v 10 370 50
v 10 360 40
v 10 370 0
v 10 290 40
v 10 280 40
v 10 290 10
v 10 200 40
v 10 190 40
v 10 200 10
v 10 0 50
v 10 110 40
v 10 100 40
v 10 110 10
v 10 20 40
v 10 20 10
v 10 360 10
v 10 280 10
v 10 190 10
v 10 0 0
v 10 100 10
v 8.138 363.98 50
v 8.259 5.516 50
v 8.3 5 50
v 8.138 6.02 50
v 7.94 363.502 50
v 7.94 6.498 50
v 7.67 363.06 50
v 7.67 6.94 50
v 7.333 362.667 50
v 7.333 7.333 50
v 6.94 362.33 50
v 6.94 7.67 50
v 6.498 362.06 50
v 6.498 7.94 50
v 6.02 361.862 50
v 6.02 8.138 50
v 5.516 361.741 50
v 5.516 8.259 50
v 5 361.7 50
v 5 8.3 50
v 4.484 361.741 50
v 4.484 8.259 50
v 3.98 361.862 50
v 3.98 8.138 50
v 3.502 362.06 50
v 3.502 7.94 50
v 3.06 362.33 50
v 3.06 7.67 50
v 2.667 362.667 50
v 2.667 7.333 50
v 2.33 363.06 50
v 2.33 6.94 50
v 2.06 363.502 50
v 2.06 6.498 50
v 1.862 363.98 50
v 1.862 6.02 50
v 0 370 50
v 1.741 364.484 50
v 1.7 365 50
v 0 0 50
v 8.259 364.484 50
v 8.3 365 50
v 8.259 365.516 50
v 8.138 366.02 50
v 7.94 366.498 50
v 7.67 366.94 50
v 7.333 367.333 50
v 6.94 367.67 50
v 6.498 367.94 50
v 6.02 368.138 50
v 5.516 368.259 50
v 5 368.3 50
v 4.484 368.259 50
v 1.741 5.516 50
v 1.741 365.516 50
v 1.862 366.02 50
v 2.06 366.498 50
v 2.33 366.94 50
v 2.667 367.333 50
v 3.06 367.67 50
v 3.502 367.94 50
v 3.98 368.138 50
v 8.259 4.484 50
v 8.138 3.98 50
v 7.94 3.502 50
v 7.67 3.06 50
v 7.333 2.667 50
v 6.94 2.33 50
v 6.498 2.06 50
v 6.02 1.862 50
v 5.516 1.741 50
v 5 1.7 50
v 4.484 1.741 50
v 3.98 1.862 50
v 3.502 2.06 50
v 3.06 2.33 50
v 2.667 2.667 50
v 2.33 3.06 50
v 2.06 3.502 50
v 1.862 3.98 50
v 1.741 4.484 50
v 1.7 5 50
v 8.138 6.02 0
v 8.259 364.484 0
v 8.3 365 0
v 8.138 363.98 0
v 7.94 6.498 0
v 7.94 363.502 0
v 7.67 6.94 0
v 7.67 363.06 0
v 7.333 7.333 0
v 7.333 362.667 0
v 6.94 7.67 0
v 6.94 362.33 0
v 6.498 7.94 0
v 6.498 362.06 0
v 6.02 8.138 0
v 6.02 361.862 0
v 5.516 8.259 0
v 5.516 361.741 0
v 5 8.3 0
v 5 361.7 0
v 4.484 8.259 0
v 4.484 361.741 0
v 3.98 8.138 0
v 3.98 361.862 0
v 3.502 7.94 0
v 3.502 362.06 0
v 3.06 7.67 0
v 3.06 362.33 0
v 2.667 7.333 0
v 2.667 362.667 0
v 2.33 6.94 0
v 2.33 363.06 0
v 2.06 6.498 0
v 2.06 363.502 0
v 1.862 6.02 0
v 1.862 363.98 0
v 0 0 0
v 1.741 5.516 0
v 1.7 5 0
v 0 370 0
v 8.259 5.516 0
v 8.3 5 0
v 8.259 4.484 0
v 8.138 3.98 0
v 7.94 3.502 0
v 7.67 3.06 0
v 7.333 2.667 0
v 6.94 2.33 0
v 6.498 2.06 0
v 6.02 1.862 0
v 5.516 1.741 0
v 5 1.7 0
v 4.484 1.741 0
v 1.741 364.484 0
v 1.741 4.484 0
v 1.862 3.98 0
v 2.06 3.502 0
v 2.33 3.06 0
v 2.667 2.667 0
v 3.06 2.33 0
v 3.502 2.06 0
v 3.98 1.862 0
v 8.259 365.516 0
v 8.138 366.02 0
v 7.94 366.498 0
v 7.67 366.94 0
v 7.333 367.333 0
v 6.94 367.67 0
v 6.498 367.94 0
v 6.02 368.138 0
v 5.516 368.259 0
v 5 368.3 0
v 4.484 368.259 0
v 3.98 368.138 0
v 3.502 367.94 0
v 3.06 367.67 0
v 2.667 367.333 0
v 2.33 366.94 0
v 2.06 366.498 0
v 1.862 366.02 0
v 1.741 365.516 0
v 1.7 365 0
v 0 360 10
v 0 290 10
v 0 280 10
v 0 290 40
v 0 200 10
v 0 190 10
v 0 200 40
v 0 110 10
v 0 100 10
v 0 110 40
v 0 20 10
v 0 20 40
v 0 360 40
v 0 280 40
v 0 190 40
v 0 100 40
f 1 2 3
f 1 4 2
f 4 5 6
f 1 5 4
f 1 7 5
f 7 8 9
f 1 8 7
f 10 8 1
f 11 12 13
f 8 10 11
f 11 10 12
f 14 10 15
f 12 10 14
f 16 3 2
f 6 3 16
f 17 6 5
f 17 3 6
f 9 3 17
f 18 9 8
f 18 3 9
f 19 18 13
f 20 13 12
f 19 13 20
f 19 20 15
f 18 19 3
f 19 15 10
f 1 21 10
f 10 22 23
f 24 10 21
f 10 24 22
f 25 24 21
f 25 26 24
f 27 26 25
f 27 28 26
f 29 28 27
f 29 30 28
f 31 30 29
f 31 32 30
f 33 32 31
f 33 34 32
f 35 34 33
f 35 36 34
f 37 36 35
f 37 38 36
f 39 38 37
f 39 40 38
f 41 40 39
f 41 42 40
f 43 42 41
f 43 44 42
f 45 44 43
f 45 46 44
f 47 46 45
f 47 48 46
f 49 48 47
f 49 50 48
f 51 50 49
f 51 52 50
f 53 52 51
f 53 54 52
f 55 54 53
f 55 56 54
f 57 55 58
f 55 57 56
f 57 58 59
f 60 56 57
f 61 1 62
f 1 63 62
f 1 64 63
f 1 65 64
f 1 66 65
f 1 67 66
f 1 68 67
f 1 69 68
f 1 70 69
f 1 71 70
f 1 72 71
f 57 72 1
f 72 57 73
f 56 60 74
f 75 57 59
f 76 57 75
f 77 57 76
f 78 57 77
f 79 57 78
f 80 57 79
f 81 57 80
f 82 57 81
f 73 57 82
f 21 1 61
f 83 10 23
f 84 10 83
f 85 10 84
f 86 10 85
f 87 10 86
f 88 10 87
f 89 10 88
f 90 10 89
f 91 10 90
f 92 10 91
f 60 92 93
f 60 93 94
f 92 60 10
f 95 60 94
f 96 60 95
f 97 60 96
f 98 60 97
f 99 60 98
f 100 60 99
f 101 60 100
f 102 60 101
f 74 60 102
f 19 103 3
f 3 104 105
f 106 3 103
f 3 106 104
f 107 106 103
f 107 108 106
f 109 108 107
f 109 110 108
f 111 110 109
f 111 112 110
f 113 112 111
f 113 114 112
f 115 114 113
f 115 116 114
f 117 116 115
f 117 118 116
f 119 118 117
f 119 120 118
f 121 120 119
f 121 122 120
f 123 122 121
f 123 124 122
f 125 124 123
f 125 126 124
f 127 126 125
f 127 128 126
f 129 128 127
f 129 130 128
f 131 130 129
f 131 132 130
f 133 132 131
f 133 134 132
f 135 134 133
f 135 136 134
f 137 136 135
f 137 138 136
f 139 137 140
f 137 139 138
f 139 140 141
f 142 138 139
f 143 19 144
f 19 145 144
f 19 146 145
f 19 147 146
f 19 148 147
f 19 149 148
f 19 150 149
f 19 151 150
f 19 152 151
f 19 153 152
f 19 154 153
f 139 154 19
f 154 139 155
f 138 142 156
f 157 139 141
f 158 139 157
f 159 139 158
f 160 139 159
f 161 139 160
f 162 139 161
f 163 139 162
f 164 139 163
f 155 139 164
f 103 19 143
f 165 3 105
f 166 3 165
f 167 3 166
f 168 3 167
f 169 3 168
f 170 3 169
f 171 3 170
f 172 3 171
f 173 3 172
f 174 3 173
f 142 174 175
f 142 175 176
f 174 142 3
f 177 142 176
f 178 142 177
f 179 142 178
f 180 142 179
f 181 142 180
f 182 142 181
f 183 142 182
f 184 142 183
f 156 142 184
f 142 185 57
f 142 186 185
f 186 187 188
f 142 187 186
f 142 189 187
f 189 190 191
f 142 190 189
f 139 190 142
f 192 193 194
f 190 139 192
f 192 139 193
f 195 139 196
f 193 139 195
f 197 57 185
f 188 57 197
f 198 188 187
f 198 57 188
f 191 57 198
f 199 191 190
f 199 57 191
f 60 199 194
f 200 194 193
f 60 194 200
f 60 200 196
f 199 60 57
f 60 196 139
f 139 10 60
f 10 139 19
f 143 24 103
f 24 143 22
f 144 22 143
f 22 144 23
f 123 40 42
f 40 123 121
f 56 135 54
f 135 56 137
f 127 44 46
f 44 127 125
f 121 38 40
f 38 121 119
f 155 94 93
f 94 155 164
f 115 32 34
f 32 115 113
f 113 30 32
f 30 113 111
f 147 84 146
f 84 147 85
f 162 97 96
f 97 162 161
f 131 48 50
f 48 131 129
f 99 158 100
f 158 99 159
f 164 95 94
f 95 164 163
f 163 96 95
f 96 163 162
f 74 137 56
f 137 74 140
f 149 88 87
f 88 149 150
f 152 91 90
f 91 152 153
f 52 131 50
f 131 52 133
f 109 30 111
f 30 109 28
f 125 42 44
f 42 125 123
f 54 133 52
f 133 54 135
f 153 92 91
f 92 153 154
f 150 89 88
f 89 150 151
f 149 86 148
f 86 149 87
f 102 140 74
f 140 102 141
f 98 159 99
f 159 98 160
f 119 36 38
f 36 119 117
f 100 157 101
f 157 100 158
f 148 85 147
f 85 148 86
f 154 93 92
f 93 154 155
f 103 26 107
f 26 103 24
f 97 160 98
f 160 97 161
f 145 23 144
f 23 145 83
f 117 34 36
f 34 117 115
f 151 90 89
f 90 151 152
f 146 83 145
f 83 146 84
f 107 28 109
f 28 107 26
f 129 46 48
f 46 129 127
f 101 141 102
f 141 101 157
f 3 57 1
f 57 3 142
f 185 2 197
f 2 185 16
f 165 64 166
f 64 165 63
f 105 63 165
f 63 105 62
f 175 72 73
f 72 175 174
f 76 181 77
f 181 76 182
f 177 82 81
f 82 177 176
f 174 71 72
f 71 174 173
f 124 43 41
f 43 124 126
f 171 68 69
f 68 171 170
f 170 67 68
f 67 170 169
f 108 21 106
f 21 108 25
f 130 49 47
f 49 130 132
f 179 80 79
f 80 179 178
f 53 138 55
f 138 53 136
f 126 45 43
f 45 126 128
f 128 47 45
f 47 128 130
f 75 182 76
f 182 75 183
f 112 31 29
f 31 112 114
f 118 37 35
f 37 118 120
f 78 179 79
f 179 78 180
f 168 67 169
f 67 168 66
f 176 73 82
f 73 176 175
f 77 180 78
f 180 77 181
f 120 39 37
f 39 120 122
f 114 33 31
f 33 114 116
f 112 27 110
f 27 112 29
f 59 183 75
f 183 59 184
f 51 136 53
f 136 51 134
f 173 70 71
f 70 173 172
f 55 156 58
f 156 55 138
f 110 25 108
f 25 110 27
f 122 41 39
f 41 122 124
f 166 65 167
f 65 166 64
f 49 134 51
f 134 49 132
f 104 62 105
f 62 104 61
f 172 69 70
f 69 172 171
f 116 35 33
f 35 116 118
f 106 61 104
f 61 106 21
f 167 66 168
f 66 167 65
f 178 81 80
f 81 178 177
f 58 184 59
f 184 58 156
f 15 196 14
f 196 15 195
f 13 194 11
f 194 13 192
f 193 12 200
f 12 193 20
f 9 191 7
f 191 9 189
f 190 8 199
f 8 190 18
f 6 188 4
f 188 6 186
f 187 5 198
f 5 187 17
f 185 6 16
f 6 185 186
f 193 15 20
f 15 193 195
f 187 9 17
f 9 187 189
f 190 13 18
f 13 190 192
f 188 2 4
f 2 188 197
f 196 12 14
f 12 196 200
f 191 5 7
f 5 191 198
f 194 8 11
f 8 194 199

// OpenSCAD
// cage_side_xpos.scad
// Generates one 50mm-tall side band for the +X wall.
// Print orientation: lies flat on z=0, thickness in +Z.
// Parameters
bar = 10;              // bar thickness (square)
inner = 350;           // internal span in Y for this wall
segH = 50;             // segment height
holeD = 6.6;           // clearance for M6 threaded rod
// grid parameters (uniform)
gap = 80;              // uniform gap between vertical bars (50-100 ok)
// Derived
outer = inner + 2*bar;  // total length including corner bars

module corner_block(){
    // 10x10 corner post section for this 50mm band, with rod hole
    difference(){
        cube([bar, bar, segH], center=false);
        translate([bar/2, bar/2, 0]) cylinder(d=holeD, h=segH, $fn=40);
    }
}

module side_band_x(){
    // Local coordinates:
    // X thickness is bar (0..bar)
    // Y runs along wall length (0..outer)
    // Z height (0..segH)

    union(){
        // corner blocks at both ends
        translate([0, 0, 0]) corner_block();
        translate([0, outer-bar, 0]) corner_block();

        // horizontal bars (bottom and top of this band) across between corner blocks
        // bottom
        translate([0, bar, 0]) cube([bar, outer-2*bar, bar], center=false);
        // top
        translate([0, bar, segH-bar]) cube([bar, outer-2*bar, bar], center=false);

        // vertical grid bars in this band (including those adjacent to corners already accounted by corner blocks)
        // Place vertical bars of 10mm width along Y with uniform gaps = gap.
        // Clear internal span is inner (between inside faces of corner posts).
        // Along Y from bar to outer-bar.
        // We start with a bar at y=bar, then gap, etc.
        y0 = bar;
        maxY = outer - bar;
        // compute how many bars fit with gap
        // pattern: bar, gap, bar, gap, ... , bar
        // available length L = maxY - y0 = inner
        L = inner;
        n = floor((L + gap) / (bar + gap));
        // Recompute to distribute uniformly: keep requested gap if exact fit; here chosen to fit nicely.
        for (k=[0:n]){
            y = y0 + k*(bar+gap);
            if (y+bar <= maxY+1e-6){
                translate([0, y, 0]) cube([bar, bar, segH], center=false);
            }
        }
    }
}

side_band_x();
